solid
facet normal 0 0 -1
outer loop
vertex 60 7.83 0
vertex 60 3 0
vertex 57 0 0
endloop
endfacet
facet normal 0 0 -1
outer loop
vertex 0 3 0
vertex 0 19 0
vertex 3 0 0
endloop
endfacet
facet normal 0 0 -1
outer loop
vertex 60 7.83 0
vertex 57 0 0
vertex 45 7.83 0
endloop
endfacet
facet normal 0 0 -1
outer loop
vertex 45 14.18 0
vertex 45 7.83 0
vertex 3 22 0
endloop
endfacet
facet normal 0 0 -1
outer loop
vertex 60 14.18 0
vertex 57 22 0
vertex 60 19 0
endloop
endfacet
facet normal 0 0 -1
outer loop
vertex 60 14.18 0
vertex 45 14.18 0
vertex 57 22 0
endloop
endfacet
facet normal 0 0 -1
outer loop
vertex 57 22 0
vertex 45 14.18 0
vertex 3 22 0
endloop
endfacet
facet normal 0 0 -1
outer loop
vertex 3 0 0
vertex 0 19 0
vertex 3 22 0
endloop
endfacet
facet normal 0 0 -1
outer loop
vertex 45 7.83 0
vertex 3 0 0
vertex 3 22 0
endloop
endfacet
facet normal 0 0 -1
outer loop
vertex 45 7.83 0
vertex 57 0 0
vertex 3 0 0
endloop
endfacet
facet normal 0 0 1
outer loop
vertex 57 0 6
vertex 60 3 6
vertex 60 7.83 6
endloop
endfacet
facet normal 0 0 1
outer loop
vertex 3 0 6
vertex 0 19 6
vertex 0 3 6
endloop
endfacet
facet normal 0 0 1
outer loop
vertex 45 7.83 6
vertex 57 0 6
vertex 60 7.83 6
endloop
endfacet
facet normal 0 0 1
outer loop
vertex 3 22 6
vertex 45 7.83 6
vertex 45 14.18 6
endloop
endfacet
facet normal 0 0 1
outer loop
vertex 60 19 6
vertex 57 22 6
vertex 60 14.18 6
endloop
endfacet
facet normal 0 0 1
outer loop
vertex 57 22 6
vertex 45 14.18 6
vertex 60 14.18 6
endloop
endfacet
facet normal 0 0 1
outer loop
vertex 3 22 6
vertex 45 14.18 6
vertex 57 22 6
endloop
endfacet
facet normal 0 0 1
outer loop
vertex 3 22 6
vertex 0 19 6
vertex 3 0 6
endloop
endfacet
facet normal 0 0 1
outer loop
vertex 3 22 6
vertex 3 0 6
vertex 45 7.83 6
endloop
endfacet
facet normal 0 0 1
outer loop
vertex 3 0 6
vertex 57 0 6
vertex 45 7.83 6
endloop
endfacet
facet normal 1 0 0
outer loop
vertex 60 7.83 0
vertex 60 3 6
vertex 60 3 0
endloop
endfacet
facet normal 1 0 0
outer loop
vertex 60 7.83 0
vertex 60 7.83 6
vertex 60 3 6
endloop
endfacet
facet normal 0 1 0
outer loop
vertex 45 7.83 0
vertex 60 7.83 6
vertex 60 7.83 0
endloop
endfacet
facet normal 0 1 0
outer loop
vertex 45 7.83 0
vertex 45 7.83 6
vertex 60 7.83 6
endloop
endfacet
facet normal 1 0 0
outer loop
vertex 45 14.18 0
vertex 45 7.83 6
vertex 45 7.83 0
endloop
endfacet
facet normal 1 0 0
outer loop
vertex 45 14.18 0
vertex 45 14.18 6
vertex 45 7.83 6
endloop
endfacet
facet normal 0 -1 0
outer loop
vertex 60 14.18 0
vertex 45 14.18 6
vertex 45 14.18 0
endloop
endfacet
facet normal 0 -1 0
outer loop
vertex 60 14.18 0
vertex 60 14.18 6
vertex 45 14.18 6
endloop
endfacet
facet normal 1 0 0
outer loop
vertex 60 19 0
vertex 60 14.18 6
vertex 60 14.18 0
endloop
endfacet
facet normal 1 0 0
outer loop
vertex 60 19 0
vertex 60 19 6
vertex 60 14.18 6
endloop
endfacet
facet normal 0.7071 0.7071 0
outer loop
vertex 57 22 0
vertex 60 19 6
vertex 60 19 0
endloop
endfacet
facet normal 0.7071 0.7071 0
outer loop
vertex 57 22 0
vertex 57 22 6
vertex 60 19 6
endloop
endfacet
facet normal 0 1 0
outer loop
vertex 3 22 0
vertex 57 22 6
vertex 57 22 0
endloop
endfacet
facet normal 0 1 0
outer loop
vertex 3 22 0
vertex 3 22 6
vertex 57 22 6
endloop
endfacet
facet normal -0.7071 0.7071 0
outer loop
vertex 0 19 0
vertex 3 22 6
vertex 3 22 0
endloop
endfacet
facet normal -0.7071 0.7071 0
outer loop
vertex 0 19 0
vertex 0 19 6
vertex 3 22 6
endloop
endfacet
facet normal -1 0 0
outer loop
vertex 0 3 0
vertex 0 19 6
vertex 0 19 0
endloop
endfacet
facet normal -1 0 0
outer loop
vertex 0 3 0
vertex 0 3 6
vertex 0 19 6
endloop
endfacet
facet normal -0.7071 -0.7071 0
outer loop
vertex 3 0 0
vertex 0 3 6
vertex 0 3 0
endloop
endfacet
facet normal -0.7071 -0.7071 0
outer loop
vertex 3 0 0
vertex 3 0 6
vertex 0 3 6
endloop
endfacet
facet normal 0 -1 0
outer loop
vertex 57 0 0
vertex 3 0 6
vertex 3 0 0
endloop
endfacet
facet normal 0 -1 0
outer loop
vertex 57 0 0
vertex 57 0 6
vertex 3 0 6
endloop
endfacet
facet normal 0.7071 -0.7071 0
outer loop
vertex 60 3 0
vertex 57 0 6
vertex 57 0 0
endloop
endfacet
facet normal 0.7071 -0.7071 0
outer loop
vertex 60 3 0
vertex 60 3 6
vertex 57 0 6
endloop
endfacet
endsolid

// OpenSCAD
$fn = 32;

// ----------------------------------------------------------------------
// C washer: 60 x 22 mm plate with an open slot
// ----------------------------------------------------------------------

// --- parameters (mm) ---
profile_height = 6;       // extrusion height
profile_points = 12;      // points of the closed outline

profile = [[3, 0], [57, 0], [60, 3], [60, 7.83], [45, 7.83], [45, 14.18], [60, 14.18], [60, 19], [57, 22], [3, 22], [0, 19], [0, 3]];  // single closed polygon, 12 points, counter clockwise

// --- the one profile operation ---
linear_extrude(height = profile_height) polygon(points = profile);
